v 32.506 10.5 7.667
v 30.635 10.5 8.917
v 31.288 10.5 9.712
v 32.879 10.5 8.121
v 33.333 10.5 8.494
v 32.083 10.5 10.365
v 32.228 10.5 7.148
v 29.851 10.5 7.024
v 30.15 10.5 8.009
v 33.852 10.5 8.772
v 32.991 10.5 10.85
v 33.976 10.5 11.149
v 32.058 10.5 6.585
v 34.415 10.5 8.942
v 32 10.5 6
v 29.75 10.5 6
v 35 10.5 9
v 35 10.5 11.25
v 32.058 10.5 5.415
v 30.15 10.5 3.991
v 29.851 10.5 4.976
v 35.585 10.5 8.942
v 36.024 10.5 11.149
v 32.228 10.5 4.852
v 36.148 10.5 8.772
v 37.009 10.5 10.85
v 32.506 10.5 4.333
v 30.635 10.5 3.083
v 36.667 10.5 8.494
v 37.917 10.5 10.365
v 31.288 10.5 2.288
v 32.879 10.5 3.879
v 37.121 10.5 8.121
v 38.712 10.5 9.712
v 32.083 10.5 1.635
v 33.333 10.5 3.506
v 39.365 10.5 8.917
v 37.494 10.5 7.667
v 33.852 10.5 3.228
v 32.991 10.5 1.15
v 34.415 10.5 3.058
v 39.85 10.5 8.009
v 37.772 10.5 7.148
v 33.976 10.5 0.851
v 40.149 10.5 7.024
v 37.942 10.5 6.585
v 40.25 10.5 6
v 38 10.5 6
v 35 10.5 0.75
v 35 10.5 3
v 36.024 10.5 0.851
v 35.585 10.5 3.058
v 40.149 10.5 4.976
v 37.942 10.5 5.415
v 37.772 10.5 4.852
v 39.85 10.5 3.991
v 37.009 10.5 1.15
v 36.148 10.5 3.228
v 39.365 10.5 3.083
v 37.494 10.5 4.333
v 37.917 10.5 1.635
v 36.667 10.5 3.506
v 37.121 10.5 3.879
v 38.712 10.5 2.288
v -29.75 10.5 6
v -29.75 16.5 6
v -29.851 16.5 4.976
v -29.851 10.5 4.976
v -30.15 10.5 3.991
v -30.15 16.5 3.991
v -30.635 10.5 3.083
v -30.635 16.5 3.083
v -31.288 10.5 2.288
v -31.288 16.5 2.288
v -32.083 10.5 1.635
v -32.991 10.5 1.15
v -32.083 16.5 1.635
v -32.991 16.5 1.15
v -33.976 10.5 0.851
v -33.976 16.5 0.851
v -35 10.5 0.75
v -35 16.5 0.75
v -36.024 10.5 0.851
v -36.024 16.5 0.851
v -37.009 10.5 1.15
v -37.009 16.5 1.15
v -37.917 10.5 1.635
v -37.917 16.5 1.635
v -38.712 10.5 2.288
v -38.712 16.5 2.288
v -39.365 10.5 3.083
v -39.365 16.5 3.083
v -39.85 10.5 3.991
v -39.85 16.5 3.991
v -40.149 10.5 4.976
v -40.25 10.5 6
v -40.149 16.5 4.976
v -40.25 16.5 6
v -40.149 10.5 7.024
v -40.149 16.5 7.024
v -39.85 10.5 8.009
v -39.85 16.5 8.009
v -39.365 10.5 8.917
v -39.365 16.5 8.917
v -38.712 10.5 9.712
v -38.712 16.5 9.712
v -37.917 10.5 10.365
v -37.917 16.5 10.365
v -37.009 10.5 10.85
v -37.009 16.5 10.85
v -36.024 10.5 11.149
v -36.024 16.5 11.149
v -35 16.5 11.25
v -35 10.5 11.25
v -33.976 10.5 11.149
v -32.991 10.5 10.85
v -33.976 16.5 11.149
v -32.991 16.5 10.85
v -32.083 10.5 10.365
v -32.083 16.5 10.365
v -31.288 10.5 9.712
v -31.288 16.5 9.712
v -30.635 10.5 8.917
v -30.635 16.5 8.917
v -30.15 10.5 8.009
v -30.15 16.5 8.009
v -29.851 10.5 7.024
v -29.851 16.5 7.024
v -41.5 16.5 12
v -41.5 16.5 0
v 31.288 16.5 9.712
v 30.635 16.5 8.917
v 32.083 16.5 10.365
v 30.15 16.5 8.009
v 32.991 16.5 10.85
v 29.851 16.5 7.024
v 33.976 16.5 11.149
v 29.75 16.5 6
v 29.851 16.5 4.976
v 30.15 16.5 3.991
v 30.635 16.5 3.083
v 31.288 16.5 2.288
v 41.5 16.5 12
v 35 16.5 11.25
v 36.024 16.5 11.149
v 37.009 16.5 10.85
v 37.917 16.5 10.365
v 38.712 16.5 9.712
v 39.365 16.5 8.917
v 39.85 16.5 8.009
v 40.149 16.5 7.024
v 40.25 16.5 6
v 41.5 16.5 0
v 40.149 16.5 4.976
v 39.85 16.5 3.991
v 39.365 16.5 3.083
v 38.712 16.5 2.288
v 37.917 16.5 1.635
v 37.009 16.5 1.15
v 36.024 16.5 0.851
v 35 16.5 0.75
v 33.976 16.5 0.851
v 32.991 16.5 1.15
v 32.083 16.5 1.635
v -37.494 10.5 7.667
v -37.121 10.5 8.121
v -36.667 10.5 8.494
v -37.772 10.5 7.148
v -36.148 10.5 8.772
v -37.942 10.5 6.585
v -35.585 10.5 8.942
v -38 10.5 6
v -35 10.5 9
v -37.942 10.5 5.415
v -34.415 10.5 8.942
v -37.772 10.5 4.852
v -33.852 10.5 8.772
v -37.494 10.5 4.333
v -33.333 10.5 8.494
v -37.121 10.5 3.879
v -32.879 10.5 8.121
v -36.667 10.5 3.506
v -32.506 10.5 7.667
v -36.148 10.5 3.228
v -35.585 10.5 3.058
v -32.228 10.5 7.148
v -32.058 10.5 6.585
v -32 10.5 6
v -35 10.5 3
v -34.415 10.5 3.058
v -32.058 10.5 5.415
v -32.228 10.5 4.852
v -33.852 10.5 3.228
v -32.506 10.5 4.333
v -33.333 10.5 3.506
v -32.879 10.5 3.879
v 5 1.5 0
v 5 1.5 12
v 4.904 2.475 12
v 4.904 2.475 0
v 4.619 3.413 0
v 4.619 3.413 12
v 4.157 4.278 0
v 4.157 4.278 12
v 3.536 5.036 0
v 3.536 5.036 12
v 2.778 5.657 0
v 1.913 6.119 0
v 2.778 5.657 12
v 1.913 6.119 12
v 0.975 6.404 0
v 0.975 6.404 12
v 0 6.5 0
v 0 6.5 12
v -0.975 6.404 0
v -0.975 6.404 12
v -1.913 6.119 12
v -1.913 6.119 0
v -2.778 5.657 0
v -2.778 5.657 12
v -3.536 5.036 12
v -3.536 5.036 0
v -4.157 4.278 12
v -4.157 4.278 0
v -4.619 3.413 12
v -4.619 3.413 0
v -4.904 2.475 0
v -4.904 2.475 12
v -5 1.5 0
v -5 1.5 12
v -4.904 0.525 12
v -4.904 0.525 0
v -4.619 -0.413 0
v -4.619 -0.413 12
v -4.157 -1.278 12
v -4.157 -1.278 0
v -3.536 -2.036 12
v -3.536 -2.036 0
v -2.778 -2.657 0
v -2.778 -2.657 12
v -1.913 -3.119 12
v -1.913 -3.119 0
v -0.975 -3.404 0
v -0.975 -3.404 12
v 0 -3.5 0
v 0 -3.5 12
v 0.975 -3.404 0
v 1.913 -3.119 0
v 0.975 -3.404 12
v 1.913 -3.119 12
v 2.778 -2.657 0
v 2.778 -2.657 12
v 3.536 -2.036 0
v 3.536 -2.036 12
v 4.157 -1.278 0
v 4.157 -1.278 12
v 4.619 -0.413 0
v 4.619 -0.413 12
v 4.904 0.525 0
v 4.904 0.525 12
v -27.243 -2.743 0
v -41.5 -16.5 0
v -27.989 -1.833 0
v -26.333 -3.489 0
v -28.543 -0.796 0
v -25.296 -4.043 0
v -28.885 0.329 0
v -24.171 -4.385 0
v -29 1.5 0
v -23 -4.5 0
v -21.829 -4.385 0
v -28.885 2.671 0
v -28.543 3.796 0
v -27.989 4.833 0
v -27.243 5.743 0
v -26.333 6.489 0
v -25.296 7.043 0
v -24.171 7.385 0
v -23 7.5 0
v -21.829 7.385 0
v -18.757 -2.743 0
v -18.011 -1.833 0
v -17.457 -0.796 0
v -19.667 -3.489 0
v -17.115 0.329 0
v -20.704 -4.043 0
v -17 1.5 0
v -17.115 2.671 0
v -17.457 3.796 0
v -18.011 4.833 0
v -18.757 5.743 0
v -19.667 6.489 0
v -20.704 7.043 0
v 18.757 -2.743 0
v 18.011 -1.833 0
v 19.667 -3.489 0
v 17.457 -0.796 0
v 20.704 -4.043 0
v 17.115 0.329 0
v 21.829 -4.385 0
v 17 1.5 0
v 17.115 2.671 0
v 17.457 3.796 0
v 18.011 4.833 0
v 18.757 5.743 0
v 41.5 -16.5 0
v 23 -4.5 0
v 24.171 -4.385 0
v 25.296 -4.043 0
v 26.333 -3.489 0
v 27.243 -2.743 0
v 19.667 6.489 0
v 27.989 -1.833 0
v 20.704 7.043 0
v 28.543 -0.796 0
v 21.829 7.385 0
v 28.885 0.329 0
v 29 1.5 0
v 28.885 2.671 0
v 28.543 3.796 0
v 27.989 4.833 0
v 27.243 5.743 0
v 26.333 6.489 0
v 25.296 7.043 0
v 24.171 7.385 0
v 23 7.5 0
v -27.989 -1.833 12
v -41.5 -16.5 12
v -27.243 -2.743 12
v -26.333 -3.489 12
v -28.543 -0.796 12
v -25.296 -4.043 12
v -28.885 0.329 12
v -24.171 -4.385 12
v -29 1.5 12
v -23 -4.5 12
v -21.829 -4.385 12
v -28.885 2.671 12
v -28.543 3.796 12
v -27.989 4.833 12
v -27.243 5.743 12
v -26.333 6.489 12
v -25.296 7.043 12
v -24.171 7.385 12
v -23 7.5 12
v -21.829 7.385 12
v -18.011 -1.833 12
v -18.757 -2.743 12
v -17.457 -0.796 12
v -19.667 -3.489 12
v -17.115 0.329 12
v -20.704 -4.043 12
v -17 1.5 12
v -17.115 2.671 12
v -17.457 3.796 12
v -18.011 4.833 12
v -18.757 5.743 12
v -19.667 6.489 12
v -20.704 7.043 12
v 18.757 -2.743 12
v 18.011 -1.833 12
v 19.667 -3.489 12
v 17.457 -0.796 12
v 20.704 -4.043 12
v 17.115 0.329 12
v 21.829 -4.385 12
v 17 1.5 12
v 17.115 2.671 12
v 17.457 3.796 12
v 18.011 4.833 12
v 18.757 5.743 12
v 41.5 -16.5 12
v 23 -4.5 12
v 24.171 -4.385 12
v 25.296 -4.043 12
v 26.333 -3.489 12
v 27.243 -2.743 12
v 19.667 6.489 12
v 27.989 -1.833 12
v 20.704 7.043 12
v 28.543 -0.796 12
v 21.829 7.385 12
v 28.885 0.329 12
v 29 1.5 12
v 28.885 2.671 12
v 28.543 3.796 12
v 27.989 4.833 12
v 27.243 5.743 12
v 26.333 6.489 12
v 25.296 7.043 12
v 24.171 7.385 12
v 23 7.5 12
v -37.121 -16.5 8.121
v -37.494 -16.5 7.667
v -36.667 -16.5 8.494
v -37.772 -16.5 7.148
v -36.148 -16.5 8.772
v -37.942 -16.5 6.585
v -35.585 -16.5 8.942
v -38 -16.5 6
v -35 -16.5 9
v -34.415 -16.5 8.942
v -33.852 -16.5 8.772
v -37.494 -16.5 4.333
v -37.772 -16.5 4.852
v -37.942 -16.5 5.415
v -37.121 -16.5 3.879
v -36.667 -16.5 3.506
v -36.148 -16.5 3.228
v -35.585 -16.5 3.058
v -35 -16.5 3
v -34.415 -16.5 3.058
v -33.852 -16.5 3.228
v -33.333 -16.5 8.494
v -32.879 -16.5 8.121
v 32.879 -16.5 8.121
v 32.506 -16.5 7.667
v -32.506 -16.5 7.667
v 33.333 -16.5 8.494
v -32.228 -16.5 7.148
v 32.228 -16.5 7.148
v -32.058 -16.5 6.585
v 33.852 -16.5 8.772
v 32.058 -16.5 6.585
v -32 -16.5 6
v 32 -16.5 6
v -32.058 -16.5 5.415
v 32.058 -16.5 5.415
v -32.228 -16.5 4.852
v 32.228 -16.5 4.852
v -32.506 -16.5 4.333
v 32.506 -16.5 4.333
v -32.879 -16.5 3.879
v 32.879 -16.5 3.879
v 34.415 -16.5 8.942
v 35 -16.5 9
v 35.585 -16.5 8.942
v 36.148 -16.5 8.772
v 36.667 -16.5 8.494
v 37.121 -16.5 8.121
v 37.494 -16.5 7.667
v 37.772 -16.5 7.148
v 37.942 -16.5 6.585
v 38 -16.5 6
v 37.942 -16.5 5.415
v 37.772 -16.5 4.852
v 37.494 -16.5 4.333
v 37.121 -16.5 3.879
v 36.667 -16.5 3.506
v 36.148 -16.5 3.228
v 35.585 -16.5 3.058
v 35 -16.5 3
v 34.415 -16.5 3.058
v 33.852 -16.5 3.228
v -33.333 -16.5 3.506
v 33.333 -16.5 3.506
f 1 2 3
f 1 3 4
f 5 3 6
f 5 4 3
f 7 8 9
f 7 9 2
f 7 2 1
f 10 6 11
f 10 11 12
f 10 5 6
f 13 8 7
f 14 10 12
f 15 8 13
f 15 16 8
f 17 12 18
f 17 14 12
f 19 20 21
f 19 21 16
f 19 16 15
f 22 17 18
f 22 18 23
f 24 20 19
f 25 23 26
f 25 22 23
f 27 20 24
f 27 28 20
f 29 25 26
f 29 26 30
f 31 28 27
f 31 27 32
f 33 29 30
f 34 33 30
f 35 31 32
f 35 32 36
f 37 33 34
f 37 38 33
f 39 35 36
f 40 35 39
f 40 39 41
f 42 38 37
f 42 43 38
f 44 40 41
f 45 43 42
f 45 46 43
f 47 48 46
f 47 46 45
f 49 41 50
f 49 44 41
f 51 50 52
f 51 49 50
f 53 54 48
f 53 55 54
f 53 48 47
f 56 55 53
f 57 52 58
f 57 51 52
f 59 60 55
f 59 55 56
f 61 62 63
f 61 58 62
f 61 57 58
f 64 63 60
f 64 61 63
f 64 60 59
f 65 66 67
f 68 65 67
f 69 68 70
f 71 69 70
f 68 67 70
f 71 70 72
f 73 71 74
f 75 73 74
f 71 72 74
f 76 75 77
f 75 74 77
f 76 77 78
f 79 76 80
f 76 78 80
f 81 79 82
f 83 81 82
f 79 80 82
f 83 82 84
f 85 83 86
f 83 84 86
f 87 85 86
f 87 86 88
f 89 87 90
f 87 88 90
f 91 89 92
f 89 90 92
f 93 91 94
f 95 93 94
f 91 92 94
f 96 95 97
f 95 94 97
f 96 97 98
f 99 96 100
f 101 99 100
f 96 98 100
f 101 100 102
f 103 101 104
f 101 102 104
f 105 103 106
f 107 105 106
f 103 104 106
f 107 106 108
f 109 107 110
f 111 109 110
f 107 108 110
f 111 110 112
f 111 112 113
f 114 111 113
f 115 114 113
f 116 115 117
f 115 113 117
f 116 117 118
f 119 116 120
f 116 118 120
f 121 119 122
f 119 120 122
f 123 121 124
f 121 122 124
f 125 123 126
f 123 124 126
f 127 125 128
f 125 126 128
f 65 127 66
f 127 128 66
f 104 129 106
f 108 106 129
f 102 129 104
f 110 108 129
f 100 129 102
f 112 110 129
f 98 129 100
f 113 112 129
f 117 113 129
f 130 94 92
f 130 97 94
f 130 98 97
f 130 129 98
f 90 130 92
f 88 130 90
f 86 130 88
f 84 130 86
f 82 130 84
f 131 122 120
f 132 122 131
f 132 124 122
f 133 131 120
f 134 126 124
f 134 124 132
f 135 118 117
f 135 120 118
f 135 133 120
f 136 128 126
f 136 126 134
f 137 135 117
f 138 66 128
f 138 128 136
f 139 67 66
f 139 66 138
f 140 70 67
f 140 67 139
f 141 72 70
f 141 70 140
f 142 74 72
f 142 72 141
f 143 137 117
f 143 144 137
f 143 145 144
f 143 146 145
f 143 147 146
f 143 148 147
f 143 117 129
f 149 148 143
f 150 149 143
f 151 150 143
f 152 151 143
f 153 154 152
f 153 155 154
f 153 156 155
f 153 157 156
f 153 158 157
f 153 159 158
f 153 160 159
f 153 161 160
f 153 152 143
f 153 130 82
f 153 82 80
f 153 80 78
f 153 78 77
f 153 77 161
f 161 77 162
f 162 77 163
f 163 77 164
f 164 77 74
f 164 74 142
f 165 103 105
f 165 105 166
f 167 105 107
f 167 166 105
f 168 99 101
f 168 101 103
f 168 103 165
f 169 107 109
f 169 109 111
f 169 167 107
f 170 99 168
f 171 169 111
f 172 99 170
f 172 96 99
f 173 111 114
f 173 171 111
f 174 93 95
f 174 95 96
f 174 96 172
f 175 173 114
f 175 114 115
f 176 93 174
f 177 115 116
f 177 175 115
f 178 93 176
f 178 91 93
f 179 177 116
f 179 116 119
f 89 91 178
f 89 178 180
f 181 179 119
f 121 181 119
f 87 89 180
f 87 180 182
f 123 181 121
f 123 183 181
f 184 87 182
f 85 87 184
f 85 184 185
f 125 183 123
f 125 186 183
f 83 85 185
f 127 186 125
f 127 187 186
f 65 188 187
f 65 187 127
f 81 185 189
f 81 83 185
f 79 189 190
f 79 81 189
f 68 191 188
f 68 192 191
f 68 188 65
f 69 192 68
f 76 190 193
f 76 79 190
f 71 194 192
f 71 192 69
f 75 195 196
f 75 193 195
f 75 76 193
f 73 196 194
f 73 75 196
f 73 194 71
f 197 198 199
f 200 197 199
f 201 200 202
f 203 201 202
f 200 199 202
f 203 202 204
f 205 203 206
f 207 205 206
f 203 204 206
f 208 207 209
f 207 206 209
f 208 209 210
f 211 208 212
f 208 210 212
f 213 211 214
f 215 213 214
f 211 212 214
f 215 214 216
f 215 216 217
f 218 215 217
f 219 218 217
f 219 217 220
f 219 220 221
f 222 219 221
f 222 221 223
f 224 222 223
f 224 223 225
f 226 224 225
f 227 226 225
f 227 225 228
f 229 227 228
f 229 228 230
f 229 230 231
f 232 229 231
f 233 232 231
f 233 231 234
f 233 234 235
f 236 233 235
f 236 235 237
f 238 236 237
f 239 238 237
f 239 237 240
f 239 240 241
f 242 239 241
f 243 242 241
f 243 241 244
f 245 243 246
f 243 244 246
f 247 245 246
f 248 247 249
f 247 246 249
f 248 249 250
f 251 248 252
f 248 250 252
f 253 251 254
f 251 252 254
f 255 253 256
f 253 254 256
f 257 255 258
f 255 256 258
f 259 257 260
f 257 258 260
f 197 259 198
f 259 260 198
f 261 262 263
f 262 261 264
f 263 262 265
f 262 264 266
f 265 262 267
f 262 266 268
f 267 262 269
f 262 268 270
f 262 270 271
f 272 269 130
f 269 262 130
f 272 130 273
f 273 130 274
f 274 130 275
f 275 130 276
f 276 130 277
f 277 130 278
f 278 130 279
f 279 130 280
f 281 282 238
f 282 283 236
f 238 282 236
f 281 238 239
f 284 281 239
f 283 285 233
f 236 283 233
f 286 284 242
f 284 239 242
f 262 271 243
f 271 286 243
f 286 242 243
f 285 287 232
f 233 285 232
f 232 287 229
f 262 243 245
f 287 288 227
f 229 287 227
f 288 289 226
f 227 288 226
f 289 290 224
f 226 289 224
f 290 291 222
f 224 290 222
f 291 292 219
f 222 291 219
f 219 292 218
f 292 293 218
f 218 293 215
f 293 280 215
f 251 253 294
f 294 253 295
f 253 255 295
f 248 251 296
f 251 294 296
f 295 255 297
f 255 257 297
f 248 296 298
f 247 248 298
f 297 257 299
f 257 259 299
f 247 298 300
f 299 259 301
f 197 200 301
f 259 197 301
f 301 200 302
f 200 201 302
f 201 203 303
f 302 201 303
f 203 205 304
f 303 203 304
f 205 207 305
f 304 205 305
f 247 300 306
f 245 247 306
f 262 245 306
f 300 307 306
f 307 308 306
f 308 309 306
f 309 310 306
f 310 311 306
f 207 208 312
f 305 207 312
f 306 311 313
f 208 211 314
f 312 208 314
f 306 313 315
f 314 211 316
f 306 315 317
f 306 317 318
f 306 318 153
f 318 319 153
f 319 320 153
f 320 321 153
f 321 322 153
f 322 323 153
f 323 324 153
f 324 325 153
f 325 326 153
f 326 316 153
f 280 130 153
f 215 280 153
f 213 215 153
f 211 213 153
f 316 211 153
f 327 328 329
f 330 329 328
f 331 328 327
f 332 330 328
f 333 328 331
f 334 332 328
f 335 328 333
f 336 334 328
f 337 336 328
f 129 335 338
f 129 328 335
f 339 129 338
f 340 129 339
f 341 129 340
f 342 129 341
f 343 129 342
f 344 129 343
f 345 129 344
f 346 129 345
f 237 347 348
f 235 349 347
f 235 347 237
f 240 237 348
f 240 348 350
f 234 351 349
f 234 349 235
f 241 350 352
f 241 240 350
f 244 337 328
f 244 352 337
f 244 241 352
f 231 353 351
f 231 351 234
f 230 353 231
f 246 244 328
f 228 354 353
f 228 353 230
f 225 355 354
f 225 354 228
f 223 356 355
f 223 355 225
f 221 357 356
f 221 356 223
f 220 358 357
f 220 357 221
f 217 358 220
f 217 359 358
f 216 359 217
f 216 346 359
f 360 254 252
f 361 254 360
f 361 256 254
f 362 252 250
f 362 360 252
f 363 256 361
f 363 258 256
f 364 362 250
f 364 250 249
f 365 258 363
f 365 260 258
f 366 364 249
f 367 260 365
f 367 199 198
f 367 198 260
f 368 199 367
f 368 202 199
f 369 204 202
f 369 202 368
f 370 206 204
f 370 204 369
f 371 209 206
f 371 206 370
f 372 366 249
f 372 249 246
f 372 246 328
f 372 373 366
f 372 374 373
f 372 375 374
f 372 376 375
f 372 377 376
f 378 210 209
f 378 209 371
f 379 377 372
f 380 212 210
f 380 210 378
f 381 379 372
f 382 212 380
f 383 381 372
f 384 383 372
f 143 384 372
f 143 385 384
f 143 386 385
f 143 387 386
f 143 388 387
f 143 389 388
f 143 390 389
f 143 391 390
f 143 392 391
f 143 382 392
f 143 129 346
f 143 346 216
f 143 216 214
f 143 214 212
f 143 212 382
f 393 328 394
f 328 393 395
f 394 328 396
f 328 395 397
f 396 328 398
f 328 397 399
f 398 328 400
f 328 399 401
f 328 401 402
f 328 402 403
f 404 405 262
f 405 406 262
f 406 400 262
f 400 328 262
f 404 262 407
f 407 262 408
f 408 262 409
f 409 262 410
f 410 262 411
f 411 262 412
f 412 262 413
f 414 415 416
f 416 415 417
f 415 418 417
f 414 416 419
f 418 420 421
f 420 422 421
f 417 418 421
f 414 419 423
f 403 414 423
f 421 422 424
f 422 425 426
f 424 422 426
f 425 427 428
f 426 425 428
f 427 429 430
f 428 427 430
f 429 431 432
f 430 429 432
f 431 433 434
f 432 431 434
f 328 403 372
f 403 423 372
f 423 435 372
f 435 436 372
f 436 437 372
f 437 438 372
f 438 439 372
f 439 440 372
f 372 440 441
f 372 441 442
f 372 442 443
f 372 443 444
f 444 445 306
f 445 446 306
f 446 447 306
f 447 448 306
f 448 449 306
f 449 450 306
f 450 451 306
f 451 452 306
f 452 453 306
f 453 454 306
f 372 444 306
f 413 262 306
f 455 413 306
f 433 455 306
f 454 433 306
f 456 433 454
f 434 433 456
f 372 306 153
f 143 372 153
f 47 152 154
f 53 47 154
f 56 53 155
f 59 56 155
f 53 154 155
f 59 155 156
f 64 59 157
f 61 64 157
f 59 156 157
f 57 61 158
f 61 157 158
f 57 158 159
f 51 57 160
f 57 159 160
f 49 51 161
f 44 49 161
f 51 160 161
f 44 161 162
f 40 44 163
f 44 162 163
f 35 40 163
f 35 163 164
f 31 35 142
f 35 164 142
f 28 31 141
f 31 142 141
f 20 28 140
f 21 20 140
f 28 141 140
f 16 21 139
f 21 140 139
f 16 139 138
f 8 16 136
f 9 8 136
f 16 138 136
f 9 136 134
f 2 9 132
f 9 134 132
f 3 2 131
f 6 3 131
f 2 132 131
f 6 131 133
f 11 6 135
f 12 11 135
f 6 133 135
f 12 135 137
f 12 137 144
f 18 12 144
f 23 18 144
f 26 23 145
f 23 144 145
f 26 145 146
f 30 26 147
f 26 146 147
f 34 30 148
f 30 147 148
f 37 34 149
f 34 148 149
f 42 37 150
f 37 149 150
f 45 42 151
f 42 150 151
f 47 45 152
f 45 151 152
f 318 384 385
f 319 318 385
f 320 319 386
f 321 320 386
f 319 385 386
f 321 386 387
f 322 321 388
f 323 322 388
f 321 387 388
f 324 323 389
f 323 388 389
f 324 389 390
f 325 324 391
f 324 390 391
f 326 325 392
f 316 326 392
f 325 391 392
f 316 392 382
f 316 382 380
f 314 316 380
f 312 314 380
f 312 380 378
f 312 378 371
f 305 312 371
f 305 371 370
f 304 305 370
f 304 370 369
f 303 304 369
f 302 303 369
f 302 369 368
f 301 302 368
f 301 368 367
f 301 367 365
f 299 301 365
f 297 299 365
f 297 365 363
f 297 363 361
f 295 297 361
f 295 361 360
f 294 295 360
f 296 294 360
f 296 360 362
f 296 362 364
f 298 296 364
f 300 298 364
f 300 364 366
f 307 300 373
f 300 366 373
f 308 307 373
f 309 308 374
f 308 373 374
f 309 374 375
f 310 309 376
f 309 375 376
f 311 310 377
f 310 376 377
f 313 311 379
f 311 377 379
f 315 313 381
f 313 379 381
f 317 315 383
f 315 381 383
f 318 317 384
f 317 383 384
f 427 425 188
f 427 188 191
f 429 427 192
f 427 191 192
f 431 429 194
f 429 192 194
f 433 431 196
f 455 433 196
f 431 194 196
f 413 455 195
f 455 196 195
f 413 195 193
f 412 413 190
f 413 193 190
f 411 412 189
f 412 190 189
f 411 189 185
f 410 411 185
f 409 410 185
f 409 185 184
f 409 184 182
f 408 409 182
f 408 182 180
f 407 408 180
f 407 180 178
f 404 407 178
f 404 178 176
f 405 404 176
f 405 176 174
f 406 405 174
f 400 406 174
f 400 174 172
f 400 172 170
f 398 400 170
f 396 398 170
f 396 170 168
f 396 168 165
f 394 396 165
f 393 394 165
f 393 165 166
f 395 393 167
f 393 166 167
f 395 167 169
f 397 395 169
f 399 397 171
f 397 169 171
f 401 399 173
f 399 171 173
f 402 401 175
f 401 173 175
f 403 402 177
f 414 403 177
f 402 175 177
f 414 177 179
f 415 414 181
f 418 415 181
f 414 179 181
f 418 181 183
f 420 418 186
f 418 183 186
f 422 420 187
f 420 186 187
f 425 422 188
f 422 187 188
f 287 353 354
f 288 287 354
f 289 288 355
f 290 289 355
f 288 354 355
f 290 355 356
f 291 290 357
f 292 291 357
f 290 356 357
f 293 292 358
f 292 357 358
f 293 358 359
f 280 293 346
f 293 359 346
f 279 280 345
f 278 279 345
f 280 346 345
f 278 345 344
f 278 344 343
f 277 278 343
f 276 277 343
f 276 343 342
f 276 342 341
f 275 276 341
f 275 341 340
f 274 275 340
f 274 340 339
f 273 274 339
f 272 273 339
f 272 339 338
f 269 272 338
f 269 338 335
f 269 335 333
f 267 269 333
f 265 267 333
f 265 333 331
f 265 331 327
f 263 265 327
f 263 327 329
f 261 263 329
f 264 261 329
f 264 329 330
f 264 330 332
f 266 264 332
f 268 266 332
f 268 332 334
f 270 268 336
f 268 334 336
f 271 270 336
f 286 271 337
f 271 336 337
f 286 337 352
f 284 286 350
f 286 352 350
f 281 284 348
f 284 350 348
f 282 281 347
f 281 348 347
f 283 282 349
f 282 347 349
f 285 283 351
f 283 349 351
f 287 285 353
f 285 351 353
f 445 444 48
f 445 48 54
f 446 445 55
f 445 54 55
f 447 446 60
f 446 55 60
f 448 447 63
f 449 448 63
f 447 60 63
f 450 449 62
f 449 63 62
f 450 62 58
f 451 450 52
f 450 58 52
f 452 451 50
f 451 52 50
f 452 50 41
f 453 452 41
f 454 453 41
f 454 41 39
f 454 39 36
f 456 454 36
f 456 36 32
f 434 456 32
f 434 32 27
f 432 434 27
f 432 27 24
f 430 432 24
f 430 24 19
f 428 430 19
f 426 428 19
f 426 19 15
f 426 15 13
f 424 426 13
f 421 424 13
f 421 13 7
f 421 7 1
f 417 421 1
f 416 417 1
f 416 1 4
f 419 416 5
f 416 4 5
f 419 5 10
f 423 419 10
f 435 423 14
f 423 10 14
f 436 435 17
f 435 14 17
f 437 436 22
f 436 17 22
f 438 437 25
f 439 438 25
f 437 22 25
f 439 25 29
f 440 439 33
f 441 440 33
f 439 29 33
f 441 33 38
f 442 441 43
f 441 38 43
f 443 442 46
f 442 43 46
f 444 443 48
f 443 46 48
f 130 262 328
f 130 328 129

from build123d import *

# Parameters (mm, degrees)
SKETCH1_W           = 83
SKETCH1_H           = 33
BOSS_EXTRUDE1_DEPTH = 12
SKETCH2_R           = 5
SKETCH2_R_2         = 6
CUT_EXTRUDE1_DEPTH  = 13
SKETCH3_R           = 3
CUT_EXTRUDE2_DEPTH  = 34
SKETCH4_R           = 5.25
CUT_EXTRUDE3_DEPTH  = 6


with BuildPart() as part:
    # Sketch1 → Boss-Extrude1 (new body)
    with BuildSketch(Plane.XY):
        Rectangle(SKETCH1_W, SKETCH1_H)
    extrude(amount=BOSS_EXTRUDE1_DEPTH)

    # Sketch2 → Cut-Extrude1 (cut, through all)
    with BuildSketch(Plane.XY.offset(12)):
        with Locations((0, 1.5)):
            Circle(SKETCH2_R)
        with Locations((-23, 1.5)):
            Circle(SKETCH2_R_2)
        with Locations((23, 1.5)):
            Circle(SKETCH2_R_2)
    extrude(amount=-CUT_EXTRUDE1_DEPTH, mode=Mode.SUBTRACT)

    # Sketch3 → Cut-Extrude2 (cut, through all)
    with BuildSketch(Plane(origin=(0, 16.5, 0), x_dir=(1, 0, 0), z_dir=(0, 1, 0))):
        with Locations((-35, -6)):
            Circle(SKETCH3_R)
        with Locations((35, -6)):
            Circle(SKETCH3_R)
    extrude(amount=-CUT_EXTRUDE2_DEPTH, mode=Mode.SUBTRACT)

    # Sketch4 → Cut-Extrude3 (cut)
    with BuildSketch(Plane(origin=(0, 16.5, 0), x_dir=(1, 0, 0), z_dir=(0, 1, 0))):
        with Locations((-35, -6)):
            Circle(SKETCH4_R)
        with Locations((35, -6)):
            Circle(SKETCH4_R)
    extrude(amount=-CUT_EXTRUDE3_DEPTH, mode=Mode.SUBTRACT)


solid = part.part
